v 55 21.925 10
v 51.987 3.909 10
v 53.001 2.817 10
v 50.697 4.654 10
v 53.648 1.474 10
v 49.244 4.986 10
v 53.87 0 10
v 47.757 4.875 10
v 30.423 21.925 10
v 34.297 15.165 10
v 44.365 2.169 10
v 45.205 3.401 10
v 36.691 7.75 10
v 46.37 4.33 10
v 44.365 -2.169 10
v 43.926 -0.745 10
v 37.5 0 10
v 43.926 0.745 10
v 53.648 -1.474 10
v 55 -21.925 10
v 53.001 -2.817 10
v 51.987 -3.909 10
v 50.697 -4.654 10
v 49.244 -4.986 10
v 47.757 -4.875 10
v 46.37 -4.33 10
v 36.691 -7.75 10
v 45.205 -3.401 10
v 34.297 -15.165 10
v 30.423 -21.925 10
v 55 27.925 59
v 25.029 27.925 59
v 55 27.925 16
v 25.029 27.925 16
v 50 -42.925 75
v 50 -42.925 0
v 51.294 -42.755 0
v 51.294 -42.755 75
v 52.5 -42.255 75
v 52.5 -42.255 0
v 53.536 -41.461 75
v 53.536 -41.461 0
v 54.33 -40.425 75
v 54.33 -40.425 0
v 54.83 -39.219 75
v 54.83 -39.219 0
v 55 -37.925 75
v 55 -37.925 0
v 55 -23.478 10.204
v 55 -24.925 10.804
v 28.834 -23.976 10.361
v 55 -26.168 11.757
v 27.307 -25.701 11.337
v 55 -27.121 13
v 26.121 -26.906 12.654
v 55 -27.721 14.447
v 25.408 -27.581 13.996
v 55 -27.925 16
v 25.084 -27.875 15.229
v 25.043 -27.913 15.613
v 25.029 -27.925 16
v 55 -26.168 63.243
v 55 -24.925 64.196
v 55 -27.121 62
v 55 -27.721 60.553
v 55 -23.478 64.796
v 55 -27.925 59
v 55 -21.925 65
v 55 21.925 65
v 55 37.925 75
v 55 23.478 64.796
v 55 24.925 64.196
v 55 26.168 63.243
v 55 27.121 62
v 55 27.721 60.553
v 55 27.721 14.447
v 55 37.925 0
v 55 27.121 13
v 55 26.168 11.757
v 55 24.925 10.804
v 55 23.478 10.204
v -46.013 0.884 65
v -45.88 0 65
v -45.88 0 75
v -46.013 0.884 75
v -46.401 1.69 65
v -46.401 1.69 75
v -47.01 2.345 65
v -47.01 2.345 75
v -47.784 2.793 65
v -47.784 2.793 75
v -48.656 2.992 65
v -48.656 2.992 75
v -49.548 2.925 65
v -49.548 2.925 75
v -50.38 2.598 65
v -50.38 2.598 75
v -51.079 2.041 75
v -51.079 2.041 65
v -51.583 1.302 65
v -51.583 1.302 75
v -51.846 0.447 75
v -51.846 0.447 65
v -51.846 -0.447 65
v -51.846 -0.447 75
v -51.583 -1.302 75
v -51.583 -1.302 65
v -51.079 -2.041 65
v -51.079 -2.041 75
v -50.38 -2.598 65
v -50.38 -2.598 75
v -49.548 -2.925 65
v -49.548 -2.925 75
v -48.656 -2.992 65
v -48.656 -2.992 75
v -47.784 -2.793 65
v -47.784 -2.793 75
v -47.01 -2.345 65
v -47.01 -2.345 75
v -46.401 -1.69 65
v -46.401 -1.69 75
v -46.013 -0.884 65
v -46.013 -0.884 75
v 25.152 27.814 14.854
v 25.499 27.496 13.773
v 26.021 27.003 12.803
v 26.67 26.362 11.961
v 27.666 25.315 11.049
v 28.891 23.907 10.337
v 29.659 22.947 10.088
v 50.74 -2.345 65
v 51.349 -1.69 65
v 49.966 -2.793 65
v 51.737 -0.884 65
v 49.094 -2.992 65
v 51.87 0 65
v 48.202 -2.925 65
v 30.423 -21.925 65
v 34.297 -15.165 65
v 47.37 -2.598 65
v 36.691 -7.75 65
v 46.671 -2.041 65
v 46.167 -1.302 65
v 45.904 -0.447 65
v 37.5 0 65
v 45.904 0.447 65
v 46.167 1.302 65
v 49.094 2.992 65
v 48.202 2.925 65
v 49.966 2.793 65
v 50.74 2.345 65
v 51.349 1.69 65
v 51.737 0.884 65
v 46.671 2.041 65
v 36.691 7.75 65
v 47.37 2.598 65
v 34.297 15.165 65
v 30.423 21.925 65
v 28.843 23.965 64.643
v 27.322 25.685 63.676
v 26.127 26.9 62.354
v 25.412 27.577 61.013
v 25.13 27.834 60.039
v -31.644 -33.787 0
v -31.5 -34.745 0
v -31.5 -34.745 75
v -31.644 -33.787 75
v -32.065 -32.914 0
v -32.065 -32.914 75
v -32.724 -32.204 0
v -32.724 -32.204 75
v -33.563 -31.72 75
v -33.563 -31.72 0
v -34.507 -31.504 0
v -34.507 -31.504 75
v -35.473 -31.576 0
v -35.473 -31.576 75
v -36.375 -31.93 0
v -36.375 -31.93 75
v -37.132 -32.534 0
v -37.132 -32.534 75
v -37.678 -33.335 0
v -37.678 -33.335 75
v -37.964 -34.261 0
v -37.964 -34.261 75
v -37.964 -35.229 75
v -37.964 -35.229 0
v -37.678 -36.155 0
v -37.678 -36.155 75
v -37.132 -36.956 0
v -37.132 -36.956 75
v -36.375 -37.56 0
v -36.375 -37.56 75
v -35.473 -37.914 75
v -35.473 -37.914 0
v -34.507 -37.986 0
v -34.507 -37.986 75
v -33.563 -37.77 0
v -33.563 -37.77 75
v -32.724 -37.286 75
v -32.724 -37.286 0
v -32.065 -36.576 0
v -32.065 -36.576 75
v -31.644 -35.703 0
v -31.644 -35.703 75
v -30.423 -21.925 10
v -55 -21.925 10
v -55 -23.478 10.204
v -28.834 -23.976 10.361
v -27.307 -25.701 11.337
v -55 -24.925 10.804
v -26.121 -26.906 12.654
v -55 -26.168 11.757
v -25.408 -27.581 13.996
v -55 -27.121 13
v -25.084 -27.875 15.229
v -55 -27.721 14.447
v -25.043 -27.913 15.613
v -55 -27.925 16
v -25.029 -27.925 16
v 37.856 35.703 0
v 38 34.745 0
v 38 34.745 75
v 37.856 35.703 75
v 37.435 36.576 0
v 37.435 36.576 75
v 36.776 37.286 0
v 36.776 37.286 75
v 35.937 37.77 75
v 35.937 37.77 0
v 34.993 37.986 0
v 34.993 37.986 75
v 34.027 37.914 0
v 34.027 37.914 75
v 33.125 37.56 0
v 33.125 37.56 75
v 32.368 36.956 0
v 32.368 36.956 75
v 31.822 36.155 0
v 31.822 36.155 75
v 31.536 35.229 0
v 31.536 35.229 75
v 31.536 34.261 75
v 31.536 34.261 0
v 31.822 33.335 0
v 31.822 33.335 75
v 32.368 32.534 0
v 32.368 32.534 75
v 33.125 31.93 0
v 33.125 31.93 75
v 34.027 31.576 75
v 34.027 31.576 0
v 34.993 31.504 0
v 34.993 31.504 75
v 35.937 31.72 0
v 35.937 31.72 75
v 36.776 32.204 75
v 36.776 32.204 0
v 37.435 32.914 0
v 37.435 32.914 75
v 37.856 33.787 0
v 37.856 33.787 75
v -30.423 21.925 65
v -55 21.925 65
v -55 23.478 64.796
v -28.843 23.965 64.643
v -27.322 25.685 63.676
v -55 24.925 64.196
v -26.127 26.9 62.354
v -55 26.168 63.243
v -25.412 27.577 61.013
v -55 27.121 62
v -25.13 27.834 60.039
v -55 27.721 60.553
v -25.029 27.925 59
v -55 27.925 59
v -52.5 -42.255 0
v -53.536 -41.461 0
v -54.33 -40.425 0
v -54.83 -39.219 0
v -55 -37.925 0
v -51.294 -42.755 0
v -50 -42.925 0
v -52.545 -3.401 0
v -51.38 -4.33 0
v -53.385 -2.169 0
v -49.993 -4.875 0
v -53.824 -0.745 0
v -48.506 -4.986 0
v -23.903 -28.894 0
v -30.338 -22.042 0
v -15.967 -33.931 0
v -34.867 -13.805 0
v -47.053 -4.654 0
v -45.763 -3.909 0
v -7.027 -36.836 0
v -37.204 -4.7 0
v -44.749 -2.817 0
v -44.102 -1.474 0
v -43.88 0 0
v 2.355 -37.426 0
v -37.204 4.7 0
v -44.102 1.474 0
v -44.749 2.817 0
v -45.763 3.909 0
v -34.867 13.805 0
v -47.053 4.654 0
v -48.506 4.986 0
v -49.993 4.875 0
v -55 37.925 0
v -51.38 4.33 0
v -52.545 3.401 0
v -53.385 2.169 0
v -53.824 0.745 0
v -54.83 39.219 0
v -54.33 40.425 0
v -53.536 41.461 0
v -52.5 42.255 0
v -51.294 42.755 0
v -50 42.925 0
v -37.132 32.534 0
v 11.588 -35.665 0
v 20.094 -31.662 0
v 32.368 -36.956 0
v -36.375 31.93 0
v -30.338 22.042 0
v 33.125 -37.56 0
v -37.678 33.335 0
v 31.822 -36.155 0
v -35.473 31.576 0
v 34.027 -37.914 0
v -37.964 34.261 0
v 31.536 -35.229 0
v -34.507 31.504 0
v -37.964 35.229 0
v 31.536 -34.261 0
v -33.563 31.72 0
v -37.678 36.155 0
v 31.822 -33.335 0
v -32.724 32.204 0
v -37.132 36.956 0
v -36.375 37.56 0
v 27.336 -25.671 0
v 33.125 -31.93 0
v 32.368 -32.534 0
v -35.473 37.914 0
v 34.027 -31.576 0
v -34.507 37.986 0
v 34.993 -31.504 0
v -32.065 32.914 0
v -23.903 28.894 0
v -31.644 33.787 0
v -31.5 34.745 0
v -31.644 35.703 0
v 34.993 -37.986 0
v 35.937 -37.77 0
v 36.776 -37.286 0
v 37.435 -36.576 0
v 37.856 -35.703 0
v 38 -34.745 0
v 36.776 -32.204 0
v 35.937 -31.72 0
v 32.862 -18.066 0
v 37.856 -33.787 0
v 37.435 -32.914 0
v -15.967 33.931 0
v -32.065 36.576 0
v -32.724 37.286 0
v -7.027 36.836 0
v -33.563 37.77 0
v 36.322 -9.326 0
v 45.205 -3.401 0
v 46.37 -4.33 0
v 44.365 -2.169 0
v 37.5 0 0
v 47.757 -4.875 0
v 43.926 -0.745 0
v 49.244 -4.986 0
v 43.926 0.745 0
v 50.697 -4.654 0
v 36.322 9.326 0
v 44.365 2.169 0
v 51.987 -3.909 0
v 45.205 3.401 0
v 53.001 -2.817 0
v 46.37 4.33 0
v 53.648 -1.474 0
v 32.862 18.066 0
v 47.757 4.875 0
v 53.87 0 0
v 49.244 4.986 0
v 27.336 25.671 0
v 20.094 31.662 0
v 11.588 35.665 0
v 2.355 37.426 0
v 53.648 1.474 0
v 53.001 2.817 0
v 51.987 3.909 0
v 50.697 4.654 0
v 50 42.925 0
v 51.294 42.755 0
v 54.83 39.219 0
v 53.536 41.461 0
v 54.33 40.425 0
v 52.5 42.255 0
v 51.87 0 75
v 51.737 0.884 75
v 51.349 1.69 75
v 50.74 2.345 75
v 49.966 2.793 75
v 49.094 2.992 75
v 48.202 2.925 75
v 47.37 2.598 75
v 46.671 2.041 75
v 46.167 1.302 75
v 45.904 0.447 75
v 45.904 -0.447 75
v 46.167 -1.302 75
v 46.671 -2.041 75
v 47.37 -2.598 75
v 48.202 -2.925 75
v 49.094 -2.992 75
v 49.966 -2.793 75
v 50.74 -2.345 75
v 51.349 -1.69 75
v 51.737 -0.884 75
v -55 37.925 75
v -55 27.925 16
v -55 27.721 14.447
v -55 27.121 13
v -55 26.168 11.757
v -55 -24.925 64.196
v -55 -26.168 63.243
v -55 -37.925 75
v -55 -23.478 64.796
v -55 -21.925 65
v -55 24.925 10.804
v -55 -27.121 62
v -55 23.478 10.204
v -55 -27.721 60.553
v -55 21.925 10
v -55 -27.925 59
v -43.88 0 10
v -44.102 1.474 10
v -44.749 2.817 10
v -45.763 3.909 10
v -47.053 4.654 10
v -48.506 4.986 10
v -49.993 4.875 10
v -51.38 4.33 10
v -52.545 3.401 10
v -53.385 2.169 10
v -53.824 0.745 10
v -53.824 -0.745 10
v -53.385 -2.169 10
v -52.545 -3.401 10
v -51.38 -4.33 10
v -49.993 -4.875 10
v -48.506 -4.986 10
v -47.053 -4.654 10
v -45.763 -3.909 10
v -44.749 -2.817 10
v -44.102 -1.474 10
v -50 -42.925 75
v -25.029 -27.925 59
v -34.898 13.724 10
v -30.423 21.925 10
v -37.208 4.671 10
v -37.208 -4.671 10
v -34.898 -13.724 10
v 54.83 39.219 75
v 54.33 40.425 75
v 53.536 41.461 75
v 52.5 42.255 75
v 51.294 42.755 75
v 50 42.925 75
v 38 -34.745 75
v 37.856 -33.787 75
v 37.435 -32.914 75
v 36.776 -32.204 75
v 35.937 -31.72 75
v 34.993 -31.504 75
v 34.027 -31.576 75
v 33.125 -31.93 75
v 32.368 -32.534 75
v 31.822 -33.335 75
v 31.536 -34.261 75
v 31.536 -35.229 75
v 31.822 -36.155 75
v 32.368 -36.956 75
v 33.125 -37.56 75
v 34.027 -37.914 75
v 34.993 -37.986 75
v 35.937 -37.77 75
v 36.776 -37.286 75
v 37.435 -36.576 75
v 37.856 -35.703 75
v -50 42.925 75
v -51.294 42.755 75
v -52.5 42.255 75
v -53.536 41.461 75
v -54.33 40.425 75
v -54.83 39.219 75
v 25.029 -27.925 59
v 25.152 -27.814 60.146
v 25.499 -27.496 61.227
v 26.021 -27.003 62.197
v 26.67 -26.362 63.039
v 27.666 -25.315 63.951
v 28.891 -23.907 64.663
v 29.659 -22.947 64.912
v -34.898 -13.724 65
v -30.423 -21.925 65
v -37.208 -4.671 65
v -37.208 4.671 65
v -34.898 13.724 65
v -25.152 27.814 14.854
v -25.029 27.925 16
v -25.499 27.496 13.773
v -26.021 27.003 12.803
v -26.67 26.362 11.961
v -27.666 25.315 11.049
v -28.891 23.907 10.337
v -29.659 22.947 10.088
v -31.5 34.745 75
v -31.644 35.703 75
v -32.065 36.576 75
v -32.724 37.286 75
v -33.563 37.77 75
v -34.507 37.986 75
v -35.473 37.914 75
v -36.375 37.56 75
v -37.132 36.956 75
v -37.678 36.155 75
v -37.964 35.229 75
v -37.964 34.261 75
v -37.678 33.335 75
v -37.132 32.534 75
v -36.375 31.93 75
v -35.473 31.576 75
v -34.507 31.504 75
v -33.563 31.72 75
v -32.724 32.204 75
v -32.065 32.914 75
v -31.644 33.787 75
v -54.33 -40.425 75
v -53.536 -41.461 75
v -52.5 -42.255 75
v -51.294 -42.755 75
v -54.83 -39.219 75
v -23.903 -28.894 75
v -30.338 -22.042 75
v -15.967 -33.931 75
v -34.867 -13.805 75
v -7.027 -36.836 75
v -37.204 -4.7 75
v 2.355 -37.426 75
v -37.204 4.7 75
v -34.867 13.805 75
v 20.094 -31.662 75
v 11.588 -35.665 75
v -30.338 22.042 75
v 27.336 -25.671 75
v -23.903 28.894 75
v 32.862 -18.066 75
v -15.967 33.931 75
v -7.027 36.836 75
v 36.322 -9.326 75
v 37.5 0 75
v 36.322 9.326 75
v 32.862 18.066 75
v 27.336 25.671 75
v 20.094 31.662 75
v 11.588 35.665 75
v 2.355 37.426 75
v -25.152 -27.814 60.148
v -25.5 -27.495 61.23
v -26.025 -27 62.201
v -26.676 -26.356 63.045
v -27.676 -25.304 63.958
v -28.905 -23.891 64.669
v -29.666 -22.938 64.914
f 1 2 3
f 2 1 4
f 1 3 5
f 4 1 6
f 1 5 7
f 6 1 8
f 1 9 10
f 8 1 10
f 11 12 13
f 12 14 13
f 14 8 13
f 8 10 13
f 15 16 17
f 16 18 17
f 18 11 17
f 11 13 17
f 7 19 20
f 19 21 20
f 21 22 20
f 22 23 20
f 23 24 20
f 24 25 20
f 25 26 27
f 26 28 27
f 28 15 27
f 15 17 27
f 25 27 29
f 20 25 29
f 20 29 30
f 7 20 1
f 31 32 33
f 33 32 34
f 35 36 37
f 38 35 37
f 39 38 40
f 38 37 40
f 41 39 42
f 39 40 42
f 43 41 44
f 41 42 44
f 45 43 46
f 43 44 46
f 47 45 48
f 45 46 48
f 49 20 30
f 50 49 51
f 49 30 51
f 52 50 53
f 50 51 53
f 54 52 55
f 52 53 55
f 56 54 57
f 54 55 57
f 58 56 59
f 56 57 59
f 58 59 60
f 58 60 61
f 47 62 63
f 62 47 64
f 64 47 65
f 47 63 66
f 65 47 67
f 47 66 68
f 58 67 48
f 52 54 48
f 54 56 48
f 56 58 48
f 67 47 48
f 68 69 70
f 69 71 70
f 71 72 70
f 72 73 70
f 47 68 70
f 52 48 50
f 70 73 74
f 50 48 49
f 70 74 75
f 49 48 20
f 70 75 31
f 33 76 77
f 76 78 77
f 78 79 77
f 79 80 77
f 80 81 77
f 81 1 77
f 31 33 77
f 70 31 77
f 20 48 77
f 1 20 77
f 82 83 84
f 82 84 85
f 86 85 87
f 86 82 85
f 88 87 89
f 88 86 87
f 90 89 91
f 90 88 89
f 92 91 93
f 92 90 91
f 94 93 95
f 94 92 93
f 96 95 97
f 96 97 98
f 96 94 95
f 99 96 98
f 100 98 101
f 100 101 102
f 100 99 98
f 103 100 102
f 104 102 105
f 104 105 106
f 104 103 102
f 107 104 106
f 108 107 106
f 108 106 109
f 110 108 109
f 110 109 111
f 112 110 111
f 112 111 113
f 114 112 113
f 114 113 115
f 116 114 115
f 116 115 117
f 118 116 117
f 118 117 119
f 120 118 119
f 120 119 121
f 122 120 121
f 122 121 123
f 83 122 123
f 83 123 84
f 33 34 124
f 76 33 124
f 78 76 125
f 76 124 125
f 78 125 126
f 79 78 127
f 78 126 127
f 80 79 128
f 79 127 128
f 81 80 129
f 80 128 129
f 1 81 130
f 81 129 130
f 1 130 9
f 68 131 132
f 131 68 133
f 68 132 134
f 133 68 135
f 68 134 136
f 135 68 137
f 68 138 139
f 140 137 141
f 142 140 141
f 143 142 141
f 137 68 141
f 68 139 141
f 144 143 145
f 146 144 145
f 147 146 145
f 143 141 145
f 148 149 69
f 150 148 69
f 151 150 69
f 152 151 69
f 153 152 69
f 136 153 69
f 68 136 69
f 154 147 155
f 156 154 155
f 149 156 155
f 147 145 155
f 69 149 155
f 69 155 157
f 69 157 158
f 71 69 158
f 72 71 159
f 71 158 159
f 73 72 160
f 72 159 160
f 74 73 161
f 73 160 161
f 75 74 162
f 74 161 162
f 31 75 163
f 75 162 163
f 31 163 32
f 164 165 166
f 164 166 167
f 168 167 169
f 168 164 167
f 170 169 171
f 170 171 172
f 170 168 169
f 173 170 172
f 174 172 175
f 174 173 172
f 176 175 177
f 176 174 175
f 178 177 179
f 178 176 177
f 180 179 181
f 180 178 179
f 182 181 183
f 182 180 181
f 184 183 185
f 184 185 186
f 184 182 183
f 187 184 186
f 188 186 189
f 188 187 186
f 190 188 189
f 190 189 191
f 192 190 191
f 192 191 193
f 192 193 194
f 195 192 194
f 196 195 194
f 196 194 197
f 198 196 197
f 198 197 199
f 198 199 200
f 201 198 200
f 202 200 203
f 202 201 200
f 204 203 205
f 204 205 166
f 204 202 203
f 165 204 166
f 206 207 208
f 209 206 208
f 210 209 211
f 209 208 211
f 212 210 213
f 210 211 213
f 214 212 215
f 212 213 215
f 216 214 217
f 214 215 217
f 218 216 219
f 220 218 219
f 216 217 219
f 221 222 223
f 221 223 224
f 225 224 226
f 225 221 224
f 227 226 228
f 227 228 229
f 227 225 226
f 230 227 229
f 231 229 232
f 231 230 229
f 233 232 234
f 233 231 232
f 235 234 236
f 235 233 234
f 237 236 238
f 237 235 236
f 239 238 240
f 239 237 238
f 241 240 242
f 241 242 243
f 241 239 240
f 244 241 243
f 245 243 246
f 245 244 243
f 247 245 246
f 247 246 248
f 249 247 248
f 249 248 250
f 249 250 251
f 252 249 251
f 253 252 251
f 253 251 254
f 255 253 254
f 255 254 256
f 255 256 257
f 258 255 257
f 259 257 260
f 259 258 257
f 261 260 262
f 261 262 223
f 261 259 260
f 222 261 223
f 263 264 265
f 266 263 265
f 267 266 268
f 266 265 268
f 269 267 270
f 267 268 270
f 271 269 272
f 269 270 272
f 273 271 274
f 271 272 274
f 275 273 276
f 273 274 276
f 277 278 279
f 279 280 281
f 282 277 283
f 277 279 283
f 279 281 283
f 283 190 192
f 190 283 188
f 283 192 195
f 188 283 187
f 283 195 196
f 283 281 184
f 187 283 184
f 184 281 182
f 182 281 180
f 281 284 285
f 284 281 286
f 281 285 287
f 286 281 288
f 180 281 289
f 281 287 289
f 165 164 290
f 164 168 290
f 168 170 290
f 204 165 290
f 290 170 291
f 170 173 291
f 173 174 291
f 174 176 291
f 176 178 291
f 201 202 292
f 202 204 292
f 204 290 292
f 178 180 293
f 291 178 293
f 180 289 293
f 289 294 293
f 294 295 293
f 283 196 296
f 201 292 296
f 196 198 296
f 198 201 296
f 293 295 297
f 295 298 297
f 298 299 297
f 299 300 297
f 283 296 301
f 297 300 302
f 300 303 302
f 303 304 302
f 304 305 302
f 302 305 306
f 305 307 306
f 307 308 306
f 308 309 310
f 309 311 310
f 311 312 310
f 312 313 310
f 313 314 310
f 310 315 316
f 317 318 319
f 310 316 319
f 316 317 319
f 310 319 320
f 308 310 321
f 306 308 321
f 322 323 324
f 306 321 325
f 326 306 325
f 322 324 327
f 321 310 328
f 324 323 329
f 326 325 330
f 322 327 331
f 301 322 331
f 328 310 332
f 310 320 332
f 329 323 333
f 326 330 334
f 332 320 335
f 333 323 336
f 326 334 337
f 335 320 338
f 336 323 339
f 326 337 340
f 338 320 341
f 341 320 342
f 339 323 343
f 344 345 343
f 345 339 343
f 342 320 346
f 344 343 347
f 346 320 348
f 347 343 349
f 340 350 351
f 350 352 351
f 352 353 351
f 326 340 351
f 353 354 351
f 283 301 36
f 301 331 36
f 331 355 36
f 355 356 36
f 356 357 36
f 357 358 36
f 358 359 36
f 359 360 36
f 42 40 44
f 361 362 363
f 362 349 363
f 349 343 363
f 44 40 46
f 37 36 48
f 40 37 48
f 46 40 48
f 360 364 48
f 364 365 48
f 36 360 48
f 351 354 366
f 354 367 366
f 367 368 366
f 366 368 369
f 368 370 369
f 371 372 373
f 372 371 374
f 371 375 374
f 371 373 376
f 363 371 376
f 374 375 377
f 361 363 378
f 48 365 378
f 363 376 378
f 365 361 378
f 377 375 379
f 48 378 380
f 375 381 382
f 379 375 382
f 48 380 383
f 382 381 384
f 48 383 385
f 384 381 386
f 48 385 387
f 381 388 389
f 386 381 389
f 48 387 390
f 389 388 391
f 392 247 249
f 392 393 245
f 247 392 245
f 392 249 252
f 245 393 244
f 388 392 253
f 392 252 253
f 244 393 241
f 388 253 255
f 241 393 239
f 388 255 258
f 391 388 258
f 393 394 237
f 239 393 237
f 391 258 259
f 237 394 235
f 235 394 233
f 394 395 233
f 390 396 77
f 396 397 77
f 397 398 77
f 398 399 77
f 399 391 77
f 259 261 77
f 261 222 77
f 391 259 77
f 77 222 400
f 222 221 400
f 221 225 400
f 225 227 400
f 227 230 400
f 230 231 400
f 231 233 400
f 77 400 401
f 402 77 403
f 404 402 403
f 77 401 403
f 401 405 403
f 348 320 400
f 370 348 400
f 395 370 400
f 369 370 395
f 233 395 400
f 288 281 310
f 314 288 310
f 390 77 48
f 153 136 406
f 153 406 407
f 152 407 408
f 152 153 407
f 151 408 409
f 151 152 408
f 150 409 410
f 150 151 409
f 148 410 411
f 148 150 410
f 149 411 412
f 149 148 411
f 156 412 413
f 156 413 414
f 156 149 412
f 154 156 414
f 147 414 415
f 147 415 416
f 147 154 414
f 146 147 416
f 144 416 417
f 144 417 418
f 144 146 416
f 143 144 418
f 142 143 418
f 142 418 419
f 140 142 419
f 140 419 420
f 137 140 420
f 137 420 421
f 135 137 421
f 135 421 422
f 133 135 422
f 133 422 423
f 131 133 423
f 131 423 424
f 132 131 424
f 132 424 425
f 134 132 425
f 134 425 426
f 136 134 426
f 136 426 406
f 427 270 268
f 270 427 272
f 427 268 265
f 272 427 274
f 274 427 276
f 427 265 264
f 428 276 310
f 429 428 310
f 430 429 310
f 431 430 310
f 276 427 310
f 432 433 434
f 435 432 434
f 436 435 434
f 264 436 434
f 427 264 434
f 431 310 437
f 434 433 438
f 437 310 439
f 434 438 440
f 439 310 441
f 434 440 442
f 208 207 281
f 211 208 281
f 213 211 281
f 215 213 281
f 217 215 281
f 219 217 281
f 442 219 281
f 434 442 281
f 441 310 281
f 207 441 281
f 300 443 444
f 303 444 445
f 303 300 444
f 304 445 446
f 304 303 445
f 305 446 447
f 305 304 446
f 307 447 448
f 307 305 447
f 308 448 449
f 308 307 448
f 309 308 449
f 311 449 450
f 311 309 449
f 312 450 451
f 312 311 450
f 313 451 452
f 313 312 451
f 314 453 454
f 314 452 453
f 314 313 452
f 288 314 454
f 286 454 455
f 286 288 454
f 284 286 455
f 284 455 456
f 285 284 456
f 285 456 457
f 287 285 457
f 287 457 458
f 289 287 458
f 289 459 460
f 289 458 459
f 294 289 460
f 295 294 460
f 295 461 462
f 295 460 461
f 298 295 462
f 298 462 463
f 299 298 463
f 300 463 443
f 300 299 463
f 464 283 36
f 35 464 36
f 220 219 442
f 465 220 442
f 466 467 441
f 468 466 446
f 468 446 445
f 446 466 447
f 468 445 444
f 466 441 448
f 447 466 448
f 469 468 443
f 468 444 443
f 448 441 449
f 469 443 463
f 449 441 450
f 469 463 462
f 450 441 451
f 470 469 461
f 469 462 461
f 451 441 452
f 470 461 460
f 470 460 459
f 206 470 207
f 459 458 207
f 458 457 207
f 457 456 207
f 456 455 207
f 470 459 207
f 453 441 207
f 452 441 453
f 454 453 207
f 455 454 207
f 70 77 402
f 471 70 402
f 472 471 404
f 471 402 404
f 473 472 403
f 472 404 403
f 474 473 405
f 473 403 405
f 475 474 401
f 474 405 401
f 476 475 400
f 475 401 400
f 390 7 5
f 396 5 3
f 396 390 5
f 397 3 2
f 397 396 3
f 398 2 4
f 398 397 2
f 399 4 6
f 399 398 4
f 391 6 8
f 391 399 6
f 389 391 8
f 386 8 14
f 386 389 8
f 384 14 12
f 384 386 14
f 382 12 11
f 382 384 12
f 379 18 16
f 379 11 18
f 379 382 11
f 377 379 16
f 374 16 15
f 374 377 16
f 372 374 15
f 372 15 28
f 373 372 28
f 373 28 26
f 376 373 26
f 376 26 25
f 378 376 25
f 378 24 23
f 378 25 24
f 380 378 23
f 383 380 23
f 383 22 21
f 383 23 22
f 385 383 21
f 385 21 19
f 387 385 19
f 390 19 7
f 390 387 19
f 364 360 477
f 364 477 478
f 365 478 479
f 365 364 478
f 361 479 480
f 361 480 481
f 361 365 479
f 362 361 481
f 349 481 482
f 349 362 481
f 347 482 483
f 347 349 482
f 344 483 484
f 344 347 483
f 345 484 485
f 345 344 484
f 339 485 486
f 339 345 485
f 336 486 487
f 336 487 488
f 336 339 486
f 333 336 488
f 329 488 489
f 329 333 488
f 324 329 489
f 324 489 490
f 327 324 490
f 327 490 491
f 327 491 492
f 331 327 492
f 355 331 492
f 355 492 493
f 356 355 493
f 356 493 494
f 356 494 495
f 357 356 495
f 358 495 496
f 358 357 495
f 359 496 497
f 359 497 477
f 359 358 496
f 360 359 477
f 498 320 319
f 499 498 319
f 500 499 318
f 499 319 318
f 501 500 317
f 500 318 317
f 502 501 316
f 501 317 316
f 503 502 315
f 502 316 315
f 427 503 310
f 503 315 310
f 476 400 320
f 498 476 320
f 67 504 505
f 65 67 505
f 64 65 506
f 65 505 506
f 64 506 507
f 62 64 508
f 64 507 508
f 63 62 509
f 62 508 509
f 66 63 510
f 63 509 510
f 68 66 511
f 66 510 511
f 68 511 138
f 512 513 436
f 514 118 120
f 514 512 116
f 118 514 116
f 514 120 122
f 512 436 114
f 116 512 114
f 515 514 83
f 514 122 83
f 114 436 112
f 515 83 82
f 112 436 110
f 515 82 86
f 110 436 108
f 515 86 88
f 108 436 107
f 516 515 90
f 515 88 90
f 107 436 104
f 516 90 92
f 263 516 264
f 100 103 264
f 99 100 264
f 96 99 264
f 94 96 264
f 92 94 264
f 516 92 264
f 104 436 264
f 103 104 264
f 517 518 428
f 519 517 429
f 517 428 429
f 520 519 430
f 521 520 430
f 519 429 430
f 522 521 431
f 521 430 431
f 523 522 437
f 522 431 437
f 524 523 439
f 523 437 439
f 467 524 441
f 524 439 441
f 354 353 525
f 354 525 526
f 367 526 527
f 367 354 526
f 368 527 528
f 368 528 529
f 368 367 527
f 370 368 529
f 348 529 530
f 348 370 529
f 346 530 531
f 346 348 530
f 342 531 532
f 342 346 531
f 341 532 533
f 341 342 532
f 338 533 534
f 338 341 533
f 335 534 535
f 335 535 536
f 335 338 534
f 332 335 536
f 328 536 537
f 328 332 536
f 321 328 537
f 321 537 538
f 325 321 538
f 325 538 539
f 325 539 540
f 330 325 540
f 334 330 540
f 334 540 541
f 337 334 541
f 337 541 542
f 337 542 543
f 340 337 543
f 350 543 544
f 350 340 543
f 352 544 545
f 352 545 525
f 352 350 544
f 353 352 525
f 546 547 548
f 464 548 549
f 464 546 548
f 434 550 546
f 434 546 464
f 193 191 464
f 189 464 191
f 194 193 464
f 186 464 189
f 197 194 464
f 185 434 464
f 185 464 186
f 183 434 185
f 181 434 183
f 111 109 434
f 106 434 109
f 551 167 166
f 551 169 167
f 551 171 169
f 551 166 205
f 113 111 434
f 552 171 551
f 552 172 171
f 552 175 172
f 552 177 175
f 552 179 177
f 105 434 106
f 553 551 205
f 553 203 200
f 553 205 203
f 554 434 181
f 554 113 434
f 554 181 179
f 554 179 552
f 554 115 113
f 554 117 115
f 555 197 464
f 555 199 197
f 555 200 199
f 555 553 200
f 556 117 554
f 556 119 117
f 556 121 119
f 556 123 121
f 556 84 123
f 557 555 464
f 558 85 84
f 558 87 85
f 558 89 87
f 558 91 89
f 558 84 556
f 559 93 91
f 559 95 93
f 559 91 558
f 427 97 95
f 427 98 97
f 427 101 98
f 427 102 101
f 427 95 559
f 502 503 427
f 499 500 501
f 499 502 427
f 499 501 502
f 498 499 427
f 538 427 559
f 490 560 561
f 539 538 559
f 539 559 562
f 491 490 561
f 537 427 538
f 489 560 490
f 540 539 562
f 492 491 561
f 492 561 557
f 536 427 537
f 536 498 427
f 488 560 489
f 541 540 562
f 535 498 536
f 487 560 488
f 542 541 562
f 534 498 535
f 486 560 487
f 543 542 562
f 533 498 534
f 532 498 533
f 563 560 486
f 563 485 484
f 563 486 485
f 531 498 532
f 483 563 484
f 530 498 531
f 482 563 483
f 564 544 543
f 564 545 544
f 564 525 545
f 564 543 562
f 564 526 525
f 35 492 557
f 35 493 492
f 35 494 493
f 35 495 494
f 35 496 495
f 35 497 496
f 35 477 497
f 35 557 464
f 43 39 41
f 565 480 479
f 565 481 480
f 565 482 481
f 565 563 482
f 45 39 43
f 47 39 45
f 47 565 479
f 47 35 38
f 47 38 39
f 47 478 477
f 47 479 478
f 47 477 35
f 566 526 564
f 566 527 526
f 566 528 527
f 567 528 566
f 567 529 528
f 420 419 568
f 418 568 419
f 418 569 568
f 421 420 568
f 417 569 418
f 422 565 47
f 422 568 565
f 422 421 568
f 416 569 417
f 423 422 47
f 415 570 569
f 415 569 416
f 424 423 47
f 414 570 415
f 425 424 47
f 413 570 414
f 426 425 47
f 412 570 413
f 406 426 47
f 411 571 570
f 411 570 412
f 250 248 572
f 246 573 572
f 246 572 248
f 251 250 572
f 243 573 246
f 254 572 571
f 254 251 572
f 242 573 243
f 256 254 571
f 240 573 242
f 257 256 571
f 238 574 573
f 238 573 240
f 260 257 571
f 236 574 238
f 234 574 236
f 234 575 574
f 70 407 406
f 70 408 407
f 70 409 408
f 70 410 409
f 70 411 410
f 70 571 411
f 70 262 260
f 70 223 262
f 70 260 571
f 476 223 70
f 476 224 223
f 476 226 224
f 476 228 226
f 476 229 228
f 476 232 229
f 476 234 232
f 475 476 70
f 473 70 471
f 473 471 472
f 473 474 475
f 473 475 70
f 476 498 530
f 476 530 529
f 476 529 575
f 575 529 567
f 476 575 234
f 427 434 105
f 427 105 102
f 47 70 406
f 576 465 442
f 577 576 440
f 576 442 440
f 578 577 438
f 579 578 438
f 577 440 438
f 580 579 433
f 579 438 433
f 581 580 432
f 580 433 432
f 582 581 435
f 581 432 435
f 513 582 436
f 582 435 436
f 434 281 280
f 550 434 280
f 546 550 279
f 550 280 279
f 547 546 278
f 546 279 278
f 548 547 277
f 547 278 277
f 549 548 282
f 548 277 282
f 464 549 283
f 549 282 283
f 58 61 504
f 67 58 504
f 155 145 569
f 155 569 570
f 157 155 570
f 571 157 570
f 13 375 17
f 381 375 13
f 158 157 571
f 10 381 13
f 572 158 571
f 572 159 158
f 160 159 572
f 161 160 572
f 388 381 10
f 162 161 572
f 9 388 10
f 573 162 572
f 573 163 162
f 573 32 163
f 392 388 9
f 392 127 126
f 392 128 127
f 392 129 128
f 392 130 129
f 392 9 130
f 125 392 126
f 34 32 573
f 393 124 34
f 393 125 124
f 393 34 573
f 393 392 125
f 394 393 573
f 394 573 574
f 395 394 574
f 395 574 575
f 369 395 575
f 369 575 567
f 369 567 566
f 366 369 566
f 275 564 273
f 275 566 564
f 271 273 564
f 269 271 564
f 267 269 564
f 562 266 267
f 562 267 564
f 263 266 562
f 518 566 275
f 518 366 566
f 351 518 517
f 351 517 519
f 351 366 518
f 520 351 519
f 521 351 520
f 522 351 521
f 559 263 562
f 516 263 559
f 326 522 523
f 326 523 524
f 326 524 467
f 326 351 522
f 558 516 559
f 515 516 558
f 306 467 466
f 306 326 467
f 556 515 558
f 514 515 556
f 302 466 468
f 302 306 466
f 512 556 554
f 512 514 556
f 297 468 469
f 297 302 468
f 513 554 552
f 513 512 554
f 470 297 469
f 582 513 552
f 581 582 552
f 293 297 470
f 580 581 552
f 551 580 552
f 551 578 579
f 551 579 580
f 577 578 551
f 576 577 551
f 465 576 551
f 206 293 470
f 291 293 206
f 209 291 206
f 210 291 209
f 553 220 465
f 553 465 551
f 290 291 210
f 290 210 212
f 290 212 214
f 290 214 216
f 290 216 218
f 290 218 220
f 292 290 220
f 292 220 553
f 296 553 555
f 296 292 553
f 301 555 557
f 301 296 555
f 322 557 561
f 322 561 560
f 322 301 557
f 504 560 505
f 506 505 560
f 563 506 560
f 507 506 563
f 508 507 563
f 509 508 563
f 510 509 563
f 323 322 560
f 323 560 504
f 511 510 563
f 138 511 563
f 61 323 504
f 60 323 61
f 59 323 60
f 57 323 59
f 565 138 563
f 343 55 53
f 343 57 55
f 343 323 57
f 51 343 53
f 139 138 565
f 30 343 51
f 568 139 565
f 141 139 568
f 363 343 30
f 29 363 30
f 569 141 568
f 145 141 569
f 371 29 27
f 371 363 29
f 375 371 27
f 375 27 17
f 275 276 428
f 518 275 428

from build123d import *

# Parameters (mm, degrees)
F0_R          = 3.25
F0_R_2        = 5
F0_R_3        = 37.5
F0_R_4        = 3
F1_DEPTH      = 75
F3_DEPTH      = 129.5235
F3_DEPTH_BACK = 58.3597
F4_DEPTH      = 40.69625


with BuildPart() as f1:
    # F0 (on Top) → F1 (new body)
    with BuildSketch(Plane.XY):
        with BuildLine():
            Line((50, 42.925), (-50, 42.925))
            ThreePointArc((-50, 42.925), (-53.535534, 41.460534), (-55, 37.925))
            Line((-55, 37.925), (-55, -37.925))
            ThreePointArc((-55, -37.925), (-53.535534, -41.460534), (-50, -42.925))
            Line((-50, -42.925), (50, -42.925))
            ThreePointArc((50, -42.925), (53.535534, -41.460534), (55, -37.925))
            Line((55, -37.925), (55, 37.925))
            ThreePointArc((55, 37.925), (53.535534, 41.460534), (50, 42.925))
        make_face()
        with Locations((-34.75, -34.745)):
            Circle(F0_R, mode=Mode.SUBTRACT)
        with Locations((34.75, -34.745)):
            Circle(F0_R, mode=Mode.SUBTRACT)
        with Locations((-48.88, 0)):
            Circle(F0_R_2, mode=Mode.SUBTRACT)
        with Locations((-34.75, 34.745)):
            Circle(F0_R, mode=Mode.SUBTRACT)
        Circle(F0_R_3, mode=Mode.SUBTRACT)
        with Locations((48.87, 0)):
            Circle(F0_R_2, mode=Mode.SUBTRACT)
        with Locations((34.75, 34.745)):
            Circle(F0_R, mode=Mode.SUBTRACT)
        with Locations((48.87, 0)):
            Circle(F0_R_2)
        with Locations((48.87, 0)):
            Circle(F0_R_4, mode=Mode.SUBTRACT)
        with Locations((-48.88, 0)):
            Circle(F0_R_2)
        with Locations((-48.88, 0)):
            Circle(F0_R_4, mode=Mode.SUBTRACT)
    extrude(amount=F1_DEPTH)

    # F2 (on face) → F3 (cut, two sides)
    with BuildSketch(Plane(origin=(-55, 0, 0), x_dir=(0, -1, 0), z_dir=(-1, 0, 0))) as f3_sk:
        with BuildLine():
            Line((21.925, 65), (-21.925, 65))
            ThreePointArc((-21.925, 65), (-26.167641, 63.242641), (-27.925, 59))
            Line((-27.925, 59), (-27.925, 16))
            ThreePointArc((-27.925, 16), (-26.167641, 11.757359), (-21.925, 10))
            Line((-21.925, 10), (21.925, 10))
            ThreePointArc((21.925, 10), (26.167641, 11.757359), (27.925, 16))
            Line((27.925, 16), (27.925, 59))
            ThreePointArc((27.925, 59), (26.167641, 63.242641), (21.925, 65))
        make_face()
    extrude(amount=-F3_DEPTH, mode=Mode.SUBTRACT)
    extrude(f3_sk.sketch, amount=-F3_DEPTH_BACK, mode=Mode.SUBTRACT)

    # F0 (on Top) → F4 (cut)
    with BuildSketch(Plane.XY):
        with Locations((-48.88, 0)):
            Circle(F0_R_2)
        with Locations((-48.88, 0)):
            Circle(F0_R_4, mode=Mode.SUBTRACT)
        with Locations((48.87, 0)):
            Circle(F0_R_2)
        with Locations((48.87, 0)):
            Circle(F0_R_4, mode=Mode.SUBTRACT)
    extrude(amount=F4_DEPTH, mode=Mode.SUBTRACT)


solid = f1.part
